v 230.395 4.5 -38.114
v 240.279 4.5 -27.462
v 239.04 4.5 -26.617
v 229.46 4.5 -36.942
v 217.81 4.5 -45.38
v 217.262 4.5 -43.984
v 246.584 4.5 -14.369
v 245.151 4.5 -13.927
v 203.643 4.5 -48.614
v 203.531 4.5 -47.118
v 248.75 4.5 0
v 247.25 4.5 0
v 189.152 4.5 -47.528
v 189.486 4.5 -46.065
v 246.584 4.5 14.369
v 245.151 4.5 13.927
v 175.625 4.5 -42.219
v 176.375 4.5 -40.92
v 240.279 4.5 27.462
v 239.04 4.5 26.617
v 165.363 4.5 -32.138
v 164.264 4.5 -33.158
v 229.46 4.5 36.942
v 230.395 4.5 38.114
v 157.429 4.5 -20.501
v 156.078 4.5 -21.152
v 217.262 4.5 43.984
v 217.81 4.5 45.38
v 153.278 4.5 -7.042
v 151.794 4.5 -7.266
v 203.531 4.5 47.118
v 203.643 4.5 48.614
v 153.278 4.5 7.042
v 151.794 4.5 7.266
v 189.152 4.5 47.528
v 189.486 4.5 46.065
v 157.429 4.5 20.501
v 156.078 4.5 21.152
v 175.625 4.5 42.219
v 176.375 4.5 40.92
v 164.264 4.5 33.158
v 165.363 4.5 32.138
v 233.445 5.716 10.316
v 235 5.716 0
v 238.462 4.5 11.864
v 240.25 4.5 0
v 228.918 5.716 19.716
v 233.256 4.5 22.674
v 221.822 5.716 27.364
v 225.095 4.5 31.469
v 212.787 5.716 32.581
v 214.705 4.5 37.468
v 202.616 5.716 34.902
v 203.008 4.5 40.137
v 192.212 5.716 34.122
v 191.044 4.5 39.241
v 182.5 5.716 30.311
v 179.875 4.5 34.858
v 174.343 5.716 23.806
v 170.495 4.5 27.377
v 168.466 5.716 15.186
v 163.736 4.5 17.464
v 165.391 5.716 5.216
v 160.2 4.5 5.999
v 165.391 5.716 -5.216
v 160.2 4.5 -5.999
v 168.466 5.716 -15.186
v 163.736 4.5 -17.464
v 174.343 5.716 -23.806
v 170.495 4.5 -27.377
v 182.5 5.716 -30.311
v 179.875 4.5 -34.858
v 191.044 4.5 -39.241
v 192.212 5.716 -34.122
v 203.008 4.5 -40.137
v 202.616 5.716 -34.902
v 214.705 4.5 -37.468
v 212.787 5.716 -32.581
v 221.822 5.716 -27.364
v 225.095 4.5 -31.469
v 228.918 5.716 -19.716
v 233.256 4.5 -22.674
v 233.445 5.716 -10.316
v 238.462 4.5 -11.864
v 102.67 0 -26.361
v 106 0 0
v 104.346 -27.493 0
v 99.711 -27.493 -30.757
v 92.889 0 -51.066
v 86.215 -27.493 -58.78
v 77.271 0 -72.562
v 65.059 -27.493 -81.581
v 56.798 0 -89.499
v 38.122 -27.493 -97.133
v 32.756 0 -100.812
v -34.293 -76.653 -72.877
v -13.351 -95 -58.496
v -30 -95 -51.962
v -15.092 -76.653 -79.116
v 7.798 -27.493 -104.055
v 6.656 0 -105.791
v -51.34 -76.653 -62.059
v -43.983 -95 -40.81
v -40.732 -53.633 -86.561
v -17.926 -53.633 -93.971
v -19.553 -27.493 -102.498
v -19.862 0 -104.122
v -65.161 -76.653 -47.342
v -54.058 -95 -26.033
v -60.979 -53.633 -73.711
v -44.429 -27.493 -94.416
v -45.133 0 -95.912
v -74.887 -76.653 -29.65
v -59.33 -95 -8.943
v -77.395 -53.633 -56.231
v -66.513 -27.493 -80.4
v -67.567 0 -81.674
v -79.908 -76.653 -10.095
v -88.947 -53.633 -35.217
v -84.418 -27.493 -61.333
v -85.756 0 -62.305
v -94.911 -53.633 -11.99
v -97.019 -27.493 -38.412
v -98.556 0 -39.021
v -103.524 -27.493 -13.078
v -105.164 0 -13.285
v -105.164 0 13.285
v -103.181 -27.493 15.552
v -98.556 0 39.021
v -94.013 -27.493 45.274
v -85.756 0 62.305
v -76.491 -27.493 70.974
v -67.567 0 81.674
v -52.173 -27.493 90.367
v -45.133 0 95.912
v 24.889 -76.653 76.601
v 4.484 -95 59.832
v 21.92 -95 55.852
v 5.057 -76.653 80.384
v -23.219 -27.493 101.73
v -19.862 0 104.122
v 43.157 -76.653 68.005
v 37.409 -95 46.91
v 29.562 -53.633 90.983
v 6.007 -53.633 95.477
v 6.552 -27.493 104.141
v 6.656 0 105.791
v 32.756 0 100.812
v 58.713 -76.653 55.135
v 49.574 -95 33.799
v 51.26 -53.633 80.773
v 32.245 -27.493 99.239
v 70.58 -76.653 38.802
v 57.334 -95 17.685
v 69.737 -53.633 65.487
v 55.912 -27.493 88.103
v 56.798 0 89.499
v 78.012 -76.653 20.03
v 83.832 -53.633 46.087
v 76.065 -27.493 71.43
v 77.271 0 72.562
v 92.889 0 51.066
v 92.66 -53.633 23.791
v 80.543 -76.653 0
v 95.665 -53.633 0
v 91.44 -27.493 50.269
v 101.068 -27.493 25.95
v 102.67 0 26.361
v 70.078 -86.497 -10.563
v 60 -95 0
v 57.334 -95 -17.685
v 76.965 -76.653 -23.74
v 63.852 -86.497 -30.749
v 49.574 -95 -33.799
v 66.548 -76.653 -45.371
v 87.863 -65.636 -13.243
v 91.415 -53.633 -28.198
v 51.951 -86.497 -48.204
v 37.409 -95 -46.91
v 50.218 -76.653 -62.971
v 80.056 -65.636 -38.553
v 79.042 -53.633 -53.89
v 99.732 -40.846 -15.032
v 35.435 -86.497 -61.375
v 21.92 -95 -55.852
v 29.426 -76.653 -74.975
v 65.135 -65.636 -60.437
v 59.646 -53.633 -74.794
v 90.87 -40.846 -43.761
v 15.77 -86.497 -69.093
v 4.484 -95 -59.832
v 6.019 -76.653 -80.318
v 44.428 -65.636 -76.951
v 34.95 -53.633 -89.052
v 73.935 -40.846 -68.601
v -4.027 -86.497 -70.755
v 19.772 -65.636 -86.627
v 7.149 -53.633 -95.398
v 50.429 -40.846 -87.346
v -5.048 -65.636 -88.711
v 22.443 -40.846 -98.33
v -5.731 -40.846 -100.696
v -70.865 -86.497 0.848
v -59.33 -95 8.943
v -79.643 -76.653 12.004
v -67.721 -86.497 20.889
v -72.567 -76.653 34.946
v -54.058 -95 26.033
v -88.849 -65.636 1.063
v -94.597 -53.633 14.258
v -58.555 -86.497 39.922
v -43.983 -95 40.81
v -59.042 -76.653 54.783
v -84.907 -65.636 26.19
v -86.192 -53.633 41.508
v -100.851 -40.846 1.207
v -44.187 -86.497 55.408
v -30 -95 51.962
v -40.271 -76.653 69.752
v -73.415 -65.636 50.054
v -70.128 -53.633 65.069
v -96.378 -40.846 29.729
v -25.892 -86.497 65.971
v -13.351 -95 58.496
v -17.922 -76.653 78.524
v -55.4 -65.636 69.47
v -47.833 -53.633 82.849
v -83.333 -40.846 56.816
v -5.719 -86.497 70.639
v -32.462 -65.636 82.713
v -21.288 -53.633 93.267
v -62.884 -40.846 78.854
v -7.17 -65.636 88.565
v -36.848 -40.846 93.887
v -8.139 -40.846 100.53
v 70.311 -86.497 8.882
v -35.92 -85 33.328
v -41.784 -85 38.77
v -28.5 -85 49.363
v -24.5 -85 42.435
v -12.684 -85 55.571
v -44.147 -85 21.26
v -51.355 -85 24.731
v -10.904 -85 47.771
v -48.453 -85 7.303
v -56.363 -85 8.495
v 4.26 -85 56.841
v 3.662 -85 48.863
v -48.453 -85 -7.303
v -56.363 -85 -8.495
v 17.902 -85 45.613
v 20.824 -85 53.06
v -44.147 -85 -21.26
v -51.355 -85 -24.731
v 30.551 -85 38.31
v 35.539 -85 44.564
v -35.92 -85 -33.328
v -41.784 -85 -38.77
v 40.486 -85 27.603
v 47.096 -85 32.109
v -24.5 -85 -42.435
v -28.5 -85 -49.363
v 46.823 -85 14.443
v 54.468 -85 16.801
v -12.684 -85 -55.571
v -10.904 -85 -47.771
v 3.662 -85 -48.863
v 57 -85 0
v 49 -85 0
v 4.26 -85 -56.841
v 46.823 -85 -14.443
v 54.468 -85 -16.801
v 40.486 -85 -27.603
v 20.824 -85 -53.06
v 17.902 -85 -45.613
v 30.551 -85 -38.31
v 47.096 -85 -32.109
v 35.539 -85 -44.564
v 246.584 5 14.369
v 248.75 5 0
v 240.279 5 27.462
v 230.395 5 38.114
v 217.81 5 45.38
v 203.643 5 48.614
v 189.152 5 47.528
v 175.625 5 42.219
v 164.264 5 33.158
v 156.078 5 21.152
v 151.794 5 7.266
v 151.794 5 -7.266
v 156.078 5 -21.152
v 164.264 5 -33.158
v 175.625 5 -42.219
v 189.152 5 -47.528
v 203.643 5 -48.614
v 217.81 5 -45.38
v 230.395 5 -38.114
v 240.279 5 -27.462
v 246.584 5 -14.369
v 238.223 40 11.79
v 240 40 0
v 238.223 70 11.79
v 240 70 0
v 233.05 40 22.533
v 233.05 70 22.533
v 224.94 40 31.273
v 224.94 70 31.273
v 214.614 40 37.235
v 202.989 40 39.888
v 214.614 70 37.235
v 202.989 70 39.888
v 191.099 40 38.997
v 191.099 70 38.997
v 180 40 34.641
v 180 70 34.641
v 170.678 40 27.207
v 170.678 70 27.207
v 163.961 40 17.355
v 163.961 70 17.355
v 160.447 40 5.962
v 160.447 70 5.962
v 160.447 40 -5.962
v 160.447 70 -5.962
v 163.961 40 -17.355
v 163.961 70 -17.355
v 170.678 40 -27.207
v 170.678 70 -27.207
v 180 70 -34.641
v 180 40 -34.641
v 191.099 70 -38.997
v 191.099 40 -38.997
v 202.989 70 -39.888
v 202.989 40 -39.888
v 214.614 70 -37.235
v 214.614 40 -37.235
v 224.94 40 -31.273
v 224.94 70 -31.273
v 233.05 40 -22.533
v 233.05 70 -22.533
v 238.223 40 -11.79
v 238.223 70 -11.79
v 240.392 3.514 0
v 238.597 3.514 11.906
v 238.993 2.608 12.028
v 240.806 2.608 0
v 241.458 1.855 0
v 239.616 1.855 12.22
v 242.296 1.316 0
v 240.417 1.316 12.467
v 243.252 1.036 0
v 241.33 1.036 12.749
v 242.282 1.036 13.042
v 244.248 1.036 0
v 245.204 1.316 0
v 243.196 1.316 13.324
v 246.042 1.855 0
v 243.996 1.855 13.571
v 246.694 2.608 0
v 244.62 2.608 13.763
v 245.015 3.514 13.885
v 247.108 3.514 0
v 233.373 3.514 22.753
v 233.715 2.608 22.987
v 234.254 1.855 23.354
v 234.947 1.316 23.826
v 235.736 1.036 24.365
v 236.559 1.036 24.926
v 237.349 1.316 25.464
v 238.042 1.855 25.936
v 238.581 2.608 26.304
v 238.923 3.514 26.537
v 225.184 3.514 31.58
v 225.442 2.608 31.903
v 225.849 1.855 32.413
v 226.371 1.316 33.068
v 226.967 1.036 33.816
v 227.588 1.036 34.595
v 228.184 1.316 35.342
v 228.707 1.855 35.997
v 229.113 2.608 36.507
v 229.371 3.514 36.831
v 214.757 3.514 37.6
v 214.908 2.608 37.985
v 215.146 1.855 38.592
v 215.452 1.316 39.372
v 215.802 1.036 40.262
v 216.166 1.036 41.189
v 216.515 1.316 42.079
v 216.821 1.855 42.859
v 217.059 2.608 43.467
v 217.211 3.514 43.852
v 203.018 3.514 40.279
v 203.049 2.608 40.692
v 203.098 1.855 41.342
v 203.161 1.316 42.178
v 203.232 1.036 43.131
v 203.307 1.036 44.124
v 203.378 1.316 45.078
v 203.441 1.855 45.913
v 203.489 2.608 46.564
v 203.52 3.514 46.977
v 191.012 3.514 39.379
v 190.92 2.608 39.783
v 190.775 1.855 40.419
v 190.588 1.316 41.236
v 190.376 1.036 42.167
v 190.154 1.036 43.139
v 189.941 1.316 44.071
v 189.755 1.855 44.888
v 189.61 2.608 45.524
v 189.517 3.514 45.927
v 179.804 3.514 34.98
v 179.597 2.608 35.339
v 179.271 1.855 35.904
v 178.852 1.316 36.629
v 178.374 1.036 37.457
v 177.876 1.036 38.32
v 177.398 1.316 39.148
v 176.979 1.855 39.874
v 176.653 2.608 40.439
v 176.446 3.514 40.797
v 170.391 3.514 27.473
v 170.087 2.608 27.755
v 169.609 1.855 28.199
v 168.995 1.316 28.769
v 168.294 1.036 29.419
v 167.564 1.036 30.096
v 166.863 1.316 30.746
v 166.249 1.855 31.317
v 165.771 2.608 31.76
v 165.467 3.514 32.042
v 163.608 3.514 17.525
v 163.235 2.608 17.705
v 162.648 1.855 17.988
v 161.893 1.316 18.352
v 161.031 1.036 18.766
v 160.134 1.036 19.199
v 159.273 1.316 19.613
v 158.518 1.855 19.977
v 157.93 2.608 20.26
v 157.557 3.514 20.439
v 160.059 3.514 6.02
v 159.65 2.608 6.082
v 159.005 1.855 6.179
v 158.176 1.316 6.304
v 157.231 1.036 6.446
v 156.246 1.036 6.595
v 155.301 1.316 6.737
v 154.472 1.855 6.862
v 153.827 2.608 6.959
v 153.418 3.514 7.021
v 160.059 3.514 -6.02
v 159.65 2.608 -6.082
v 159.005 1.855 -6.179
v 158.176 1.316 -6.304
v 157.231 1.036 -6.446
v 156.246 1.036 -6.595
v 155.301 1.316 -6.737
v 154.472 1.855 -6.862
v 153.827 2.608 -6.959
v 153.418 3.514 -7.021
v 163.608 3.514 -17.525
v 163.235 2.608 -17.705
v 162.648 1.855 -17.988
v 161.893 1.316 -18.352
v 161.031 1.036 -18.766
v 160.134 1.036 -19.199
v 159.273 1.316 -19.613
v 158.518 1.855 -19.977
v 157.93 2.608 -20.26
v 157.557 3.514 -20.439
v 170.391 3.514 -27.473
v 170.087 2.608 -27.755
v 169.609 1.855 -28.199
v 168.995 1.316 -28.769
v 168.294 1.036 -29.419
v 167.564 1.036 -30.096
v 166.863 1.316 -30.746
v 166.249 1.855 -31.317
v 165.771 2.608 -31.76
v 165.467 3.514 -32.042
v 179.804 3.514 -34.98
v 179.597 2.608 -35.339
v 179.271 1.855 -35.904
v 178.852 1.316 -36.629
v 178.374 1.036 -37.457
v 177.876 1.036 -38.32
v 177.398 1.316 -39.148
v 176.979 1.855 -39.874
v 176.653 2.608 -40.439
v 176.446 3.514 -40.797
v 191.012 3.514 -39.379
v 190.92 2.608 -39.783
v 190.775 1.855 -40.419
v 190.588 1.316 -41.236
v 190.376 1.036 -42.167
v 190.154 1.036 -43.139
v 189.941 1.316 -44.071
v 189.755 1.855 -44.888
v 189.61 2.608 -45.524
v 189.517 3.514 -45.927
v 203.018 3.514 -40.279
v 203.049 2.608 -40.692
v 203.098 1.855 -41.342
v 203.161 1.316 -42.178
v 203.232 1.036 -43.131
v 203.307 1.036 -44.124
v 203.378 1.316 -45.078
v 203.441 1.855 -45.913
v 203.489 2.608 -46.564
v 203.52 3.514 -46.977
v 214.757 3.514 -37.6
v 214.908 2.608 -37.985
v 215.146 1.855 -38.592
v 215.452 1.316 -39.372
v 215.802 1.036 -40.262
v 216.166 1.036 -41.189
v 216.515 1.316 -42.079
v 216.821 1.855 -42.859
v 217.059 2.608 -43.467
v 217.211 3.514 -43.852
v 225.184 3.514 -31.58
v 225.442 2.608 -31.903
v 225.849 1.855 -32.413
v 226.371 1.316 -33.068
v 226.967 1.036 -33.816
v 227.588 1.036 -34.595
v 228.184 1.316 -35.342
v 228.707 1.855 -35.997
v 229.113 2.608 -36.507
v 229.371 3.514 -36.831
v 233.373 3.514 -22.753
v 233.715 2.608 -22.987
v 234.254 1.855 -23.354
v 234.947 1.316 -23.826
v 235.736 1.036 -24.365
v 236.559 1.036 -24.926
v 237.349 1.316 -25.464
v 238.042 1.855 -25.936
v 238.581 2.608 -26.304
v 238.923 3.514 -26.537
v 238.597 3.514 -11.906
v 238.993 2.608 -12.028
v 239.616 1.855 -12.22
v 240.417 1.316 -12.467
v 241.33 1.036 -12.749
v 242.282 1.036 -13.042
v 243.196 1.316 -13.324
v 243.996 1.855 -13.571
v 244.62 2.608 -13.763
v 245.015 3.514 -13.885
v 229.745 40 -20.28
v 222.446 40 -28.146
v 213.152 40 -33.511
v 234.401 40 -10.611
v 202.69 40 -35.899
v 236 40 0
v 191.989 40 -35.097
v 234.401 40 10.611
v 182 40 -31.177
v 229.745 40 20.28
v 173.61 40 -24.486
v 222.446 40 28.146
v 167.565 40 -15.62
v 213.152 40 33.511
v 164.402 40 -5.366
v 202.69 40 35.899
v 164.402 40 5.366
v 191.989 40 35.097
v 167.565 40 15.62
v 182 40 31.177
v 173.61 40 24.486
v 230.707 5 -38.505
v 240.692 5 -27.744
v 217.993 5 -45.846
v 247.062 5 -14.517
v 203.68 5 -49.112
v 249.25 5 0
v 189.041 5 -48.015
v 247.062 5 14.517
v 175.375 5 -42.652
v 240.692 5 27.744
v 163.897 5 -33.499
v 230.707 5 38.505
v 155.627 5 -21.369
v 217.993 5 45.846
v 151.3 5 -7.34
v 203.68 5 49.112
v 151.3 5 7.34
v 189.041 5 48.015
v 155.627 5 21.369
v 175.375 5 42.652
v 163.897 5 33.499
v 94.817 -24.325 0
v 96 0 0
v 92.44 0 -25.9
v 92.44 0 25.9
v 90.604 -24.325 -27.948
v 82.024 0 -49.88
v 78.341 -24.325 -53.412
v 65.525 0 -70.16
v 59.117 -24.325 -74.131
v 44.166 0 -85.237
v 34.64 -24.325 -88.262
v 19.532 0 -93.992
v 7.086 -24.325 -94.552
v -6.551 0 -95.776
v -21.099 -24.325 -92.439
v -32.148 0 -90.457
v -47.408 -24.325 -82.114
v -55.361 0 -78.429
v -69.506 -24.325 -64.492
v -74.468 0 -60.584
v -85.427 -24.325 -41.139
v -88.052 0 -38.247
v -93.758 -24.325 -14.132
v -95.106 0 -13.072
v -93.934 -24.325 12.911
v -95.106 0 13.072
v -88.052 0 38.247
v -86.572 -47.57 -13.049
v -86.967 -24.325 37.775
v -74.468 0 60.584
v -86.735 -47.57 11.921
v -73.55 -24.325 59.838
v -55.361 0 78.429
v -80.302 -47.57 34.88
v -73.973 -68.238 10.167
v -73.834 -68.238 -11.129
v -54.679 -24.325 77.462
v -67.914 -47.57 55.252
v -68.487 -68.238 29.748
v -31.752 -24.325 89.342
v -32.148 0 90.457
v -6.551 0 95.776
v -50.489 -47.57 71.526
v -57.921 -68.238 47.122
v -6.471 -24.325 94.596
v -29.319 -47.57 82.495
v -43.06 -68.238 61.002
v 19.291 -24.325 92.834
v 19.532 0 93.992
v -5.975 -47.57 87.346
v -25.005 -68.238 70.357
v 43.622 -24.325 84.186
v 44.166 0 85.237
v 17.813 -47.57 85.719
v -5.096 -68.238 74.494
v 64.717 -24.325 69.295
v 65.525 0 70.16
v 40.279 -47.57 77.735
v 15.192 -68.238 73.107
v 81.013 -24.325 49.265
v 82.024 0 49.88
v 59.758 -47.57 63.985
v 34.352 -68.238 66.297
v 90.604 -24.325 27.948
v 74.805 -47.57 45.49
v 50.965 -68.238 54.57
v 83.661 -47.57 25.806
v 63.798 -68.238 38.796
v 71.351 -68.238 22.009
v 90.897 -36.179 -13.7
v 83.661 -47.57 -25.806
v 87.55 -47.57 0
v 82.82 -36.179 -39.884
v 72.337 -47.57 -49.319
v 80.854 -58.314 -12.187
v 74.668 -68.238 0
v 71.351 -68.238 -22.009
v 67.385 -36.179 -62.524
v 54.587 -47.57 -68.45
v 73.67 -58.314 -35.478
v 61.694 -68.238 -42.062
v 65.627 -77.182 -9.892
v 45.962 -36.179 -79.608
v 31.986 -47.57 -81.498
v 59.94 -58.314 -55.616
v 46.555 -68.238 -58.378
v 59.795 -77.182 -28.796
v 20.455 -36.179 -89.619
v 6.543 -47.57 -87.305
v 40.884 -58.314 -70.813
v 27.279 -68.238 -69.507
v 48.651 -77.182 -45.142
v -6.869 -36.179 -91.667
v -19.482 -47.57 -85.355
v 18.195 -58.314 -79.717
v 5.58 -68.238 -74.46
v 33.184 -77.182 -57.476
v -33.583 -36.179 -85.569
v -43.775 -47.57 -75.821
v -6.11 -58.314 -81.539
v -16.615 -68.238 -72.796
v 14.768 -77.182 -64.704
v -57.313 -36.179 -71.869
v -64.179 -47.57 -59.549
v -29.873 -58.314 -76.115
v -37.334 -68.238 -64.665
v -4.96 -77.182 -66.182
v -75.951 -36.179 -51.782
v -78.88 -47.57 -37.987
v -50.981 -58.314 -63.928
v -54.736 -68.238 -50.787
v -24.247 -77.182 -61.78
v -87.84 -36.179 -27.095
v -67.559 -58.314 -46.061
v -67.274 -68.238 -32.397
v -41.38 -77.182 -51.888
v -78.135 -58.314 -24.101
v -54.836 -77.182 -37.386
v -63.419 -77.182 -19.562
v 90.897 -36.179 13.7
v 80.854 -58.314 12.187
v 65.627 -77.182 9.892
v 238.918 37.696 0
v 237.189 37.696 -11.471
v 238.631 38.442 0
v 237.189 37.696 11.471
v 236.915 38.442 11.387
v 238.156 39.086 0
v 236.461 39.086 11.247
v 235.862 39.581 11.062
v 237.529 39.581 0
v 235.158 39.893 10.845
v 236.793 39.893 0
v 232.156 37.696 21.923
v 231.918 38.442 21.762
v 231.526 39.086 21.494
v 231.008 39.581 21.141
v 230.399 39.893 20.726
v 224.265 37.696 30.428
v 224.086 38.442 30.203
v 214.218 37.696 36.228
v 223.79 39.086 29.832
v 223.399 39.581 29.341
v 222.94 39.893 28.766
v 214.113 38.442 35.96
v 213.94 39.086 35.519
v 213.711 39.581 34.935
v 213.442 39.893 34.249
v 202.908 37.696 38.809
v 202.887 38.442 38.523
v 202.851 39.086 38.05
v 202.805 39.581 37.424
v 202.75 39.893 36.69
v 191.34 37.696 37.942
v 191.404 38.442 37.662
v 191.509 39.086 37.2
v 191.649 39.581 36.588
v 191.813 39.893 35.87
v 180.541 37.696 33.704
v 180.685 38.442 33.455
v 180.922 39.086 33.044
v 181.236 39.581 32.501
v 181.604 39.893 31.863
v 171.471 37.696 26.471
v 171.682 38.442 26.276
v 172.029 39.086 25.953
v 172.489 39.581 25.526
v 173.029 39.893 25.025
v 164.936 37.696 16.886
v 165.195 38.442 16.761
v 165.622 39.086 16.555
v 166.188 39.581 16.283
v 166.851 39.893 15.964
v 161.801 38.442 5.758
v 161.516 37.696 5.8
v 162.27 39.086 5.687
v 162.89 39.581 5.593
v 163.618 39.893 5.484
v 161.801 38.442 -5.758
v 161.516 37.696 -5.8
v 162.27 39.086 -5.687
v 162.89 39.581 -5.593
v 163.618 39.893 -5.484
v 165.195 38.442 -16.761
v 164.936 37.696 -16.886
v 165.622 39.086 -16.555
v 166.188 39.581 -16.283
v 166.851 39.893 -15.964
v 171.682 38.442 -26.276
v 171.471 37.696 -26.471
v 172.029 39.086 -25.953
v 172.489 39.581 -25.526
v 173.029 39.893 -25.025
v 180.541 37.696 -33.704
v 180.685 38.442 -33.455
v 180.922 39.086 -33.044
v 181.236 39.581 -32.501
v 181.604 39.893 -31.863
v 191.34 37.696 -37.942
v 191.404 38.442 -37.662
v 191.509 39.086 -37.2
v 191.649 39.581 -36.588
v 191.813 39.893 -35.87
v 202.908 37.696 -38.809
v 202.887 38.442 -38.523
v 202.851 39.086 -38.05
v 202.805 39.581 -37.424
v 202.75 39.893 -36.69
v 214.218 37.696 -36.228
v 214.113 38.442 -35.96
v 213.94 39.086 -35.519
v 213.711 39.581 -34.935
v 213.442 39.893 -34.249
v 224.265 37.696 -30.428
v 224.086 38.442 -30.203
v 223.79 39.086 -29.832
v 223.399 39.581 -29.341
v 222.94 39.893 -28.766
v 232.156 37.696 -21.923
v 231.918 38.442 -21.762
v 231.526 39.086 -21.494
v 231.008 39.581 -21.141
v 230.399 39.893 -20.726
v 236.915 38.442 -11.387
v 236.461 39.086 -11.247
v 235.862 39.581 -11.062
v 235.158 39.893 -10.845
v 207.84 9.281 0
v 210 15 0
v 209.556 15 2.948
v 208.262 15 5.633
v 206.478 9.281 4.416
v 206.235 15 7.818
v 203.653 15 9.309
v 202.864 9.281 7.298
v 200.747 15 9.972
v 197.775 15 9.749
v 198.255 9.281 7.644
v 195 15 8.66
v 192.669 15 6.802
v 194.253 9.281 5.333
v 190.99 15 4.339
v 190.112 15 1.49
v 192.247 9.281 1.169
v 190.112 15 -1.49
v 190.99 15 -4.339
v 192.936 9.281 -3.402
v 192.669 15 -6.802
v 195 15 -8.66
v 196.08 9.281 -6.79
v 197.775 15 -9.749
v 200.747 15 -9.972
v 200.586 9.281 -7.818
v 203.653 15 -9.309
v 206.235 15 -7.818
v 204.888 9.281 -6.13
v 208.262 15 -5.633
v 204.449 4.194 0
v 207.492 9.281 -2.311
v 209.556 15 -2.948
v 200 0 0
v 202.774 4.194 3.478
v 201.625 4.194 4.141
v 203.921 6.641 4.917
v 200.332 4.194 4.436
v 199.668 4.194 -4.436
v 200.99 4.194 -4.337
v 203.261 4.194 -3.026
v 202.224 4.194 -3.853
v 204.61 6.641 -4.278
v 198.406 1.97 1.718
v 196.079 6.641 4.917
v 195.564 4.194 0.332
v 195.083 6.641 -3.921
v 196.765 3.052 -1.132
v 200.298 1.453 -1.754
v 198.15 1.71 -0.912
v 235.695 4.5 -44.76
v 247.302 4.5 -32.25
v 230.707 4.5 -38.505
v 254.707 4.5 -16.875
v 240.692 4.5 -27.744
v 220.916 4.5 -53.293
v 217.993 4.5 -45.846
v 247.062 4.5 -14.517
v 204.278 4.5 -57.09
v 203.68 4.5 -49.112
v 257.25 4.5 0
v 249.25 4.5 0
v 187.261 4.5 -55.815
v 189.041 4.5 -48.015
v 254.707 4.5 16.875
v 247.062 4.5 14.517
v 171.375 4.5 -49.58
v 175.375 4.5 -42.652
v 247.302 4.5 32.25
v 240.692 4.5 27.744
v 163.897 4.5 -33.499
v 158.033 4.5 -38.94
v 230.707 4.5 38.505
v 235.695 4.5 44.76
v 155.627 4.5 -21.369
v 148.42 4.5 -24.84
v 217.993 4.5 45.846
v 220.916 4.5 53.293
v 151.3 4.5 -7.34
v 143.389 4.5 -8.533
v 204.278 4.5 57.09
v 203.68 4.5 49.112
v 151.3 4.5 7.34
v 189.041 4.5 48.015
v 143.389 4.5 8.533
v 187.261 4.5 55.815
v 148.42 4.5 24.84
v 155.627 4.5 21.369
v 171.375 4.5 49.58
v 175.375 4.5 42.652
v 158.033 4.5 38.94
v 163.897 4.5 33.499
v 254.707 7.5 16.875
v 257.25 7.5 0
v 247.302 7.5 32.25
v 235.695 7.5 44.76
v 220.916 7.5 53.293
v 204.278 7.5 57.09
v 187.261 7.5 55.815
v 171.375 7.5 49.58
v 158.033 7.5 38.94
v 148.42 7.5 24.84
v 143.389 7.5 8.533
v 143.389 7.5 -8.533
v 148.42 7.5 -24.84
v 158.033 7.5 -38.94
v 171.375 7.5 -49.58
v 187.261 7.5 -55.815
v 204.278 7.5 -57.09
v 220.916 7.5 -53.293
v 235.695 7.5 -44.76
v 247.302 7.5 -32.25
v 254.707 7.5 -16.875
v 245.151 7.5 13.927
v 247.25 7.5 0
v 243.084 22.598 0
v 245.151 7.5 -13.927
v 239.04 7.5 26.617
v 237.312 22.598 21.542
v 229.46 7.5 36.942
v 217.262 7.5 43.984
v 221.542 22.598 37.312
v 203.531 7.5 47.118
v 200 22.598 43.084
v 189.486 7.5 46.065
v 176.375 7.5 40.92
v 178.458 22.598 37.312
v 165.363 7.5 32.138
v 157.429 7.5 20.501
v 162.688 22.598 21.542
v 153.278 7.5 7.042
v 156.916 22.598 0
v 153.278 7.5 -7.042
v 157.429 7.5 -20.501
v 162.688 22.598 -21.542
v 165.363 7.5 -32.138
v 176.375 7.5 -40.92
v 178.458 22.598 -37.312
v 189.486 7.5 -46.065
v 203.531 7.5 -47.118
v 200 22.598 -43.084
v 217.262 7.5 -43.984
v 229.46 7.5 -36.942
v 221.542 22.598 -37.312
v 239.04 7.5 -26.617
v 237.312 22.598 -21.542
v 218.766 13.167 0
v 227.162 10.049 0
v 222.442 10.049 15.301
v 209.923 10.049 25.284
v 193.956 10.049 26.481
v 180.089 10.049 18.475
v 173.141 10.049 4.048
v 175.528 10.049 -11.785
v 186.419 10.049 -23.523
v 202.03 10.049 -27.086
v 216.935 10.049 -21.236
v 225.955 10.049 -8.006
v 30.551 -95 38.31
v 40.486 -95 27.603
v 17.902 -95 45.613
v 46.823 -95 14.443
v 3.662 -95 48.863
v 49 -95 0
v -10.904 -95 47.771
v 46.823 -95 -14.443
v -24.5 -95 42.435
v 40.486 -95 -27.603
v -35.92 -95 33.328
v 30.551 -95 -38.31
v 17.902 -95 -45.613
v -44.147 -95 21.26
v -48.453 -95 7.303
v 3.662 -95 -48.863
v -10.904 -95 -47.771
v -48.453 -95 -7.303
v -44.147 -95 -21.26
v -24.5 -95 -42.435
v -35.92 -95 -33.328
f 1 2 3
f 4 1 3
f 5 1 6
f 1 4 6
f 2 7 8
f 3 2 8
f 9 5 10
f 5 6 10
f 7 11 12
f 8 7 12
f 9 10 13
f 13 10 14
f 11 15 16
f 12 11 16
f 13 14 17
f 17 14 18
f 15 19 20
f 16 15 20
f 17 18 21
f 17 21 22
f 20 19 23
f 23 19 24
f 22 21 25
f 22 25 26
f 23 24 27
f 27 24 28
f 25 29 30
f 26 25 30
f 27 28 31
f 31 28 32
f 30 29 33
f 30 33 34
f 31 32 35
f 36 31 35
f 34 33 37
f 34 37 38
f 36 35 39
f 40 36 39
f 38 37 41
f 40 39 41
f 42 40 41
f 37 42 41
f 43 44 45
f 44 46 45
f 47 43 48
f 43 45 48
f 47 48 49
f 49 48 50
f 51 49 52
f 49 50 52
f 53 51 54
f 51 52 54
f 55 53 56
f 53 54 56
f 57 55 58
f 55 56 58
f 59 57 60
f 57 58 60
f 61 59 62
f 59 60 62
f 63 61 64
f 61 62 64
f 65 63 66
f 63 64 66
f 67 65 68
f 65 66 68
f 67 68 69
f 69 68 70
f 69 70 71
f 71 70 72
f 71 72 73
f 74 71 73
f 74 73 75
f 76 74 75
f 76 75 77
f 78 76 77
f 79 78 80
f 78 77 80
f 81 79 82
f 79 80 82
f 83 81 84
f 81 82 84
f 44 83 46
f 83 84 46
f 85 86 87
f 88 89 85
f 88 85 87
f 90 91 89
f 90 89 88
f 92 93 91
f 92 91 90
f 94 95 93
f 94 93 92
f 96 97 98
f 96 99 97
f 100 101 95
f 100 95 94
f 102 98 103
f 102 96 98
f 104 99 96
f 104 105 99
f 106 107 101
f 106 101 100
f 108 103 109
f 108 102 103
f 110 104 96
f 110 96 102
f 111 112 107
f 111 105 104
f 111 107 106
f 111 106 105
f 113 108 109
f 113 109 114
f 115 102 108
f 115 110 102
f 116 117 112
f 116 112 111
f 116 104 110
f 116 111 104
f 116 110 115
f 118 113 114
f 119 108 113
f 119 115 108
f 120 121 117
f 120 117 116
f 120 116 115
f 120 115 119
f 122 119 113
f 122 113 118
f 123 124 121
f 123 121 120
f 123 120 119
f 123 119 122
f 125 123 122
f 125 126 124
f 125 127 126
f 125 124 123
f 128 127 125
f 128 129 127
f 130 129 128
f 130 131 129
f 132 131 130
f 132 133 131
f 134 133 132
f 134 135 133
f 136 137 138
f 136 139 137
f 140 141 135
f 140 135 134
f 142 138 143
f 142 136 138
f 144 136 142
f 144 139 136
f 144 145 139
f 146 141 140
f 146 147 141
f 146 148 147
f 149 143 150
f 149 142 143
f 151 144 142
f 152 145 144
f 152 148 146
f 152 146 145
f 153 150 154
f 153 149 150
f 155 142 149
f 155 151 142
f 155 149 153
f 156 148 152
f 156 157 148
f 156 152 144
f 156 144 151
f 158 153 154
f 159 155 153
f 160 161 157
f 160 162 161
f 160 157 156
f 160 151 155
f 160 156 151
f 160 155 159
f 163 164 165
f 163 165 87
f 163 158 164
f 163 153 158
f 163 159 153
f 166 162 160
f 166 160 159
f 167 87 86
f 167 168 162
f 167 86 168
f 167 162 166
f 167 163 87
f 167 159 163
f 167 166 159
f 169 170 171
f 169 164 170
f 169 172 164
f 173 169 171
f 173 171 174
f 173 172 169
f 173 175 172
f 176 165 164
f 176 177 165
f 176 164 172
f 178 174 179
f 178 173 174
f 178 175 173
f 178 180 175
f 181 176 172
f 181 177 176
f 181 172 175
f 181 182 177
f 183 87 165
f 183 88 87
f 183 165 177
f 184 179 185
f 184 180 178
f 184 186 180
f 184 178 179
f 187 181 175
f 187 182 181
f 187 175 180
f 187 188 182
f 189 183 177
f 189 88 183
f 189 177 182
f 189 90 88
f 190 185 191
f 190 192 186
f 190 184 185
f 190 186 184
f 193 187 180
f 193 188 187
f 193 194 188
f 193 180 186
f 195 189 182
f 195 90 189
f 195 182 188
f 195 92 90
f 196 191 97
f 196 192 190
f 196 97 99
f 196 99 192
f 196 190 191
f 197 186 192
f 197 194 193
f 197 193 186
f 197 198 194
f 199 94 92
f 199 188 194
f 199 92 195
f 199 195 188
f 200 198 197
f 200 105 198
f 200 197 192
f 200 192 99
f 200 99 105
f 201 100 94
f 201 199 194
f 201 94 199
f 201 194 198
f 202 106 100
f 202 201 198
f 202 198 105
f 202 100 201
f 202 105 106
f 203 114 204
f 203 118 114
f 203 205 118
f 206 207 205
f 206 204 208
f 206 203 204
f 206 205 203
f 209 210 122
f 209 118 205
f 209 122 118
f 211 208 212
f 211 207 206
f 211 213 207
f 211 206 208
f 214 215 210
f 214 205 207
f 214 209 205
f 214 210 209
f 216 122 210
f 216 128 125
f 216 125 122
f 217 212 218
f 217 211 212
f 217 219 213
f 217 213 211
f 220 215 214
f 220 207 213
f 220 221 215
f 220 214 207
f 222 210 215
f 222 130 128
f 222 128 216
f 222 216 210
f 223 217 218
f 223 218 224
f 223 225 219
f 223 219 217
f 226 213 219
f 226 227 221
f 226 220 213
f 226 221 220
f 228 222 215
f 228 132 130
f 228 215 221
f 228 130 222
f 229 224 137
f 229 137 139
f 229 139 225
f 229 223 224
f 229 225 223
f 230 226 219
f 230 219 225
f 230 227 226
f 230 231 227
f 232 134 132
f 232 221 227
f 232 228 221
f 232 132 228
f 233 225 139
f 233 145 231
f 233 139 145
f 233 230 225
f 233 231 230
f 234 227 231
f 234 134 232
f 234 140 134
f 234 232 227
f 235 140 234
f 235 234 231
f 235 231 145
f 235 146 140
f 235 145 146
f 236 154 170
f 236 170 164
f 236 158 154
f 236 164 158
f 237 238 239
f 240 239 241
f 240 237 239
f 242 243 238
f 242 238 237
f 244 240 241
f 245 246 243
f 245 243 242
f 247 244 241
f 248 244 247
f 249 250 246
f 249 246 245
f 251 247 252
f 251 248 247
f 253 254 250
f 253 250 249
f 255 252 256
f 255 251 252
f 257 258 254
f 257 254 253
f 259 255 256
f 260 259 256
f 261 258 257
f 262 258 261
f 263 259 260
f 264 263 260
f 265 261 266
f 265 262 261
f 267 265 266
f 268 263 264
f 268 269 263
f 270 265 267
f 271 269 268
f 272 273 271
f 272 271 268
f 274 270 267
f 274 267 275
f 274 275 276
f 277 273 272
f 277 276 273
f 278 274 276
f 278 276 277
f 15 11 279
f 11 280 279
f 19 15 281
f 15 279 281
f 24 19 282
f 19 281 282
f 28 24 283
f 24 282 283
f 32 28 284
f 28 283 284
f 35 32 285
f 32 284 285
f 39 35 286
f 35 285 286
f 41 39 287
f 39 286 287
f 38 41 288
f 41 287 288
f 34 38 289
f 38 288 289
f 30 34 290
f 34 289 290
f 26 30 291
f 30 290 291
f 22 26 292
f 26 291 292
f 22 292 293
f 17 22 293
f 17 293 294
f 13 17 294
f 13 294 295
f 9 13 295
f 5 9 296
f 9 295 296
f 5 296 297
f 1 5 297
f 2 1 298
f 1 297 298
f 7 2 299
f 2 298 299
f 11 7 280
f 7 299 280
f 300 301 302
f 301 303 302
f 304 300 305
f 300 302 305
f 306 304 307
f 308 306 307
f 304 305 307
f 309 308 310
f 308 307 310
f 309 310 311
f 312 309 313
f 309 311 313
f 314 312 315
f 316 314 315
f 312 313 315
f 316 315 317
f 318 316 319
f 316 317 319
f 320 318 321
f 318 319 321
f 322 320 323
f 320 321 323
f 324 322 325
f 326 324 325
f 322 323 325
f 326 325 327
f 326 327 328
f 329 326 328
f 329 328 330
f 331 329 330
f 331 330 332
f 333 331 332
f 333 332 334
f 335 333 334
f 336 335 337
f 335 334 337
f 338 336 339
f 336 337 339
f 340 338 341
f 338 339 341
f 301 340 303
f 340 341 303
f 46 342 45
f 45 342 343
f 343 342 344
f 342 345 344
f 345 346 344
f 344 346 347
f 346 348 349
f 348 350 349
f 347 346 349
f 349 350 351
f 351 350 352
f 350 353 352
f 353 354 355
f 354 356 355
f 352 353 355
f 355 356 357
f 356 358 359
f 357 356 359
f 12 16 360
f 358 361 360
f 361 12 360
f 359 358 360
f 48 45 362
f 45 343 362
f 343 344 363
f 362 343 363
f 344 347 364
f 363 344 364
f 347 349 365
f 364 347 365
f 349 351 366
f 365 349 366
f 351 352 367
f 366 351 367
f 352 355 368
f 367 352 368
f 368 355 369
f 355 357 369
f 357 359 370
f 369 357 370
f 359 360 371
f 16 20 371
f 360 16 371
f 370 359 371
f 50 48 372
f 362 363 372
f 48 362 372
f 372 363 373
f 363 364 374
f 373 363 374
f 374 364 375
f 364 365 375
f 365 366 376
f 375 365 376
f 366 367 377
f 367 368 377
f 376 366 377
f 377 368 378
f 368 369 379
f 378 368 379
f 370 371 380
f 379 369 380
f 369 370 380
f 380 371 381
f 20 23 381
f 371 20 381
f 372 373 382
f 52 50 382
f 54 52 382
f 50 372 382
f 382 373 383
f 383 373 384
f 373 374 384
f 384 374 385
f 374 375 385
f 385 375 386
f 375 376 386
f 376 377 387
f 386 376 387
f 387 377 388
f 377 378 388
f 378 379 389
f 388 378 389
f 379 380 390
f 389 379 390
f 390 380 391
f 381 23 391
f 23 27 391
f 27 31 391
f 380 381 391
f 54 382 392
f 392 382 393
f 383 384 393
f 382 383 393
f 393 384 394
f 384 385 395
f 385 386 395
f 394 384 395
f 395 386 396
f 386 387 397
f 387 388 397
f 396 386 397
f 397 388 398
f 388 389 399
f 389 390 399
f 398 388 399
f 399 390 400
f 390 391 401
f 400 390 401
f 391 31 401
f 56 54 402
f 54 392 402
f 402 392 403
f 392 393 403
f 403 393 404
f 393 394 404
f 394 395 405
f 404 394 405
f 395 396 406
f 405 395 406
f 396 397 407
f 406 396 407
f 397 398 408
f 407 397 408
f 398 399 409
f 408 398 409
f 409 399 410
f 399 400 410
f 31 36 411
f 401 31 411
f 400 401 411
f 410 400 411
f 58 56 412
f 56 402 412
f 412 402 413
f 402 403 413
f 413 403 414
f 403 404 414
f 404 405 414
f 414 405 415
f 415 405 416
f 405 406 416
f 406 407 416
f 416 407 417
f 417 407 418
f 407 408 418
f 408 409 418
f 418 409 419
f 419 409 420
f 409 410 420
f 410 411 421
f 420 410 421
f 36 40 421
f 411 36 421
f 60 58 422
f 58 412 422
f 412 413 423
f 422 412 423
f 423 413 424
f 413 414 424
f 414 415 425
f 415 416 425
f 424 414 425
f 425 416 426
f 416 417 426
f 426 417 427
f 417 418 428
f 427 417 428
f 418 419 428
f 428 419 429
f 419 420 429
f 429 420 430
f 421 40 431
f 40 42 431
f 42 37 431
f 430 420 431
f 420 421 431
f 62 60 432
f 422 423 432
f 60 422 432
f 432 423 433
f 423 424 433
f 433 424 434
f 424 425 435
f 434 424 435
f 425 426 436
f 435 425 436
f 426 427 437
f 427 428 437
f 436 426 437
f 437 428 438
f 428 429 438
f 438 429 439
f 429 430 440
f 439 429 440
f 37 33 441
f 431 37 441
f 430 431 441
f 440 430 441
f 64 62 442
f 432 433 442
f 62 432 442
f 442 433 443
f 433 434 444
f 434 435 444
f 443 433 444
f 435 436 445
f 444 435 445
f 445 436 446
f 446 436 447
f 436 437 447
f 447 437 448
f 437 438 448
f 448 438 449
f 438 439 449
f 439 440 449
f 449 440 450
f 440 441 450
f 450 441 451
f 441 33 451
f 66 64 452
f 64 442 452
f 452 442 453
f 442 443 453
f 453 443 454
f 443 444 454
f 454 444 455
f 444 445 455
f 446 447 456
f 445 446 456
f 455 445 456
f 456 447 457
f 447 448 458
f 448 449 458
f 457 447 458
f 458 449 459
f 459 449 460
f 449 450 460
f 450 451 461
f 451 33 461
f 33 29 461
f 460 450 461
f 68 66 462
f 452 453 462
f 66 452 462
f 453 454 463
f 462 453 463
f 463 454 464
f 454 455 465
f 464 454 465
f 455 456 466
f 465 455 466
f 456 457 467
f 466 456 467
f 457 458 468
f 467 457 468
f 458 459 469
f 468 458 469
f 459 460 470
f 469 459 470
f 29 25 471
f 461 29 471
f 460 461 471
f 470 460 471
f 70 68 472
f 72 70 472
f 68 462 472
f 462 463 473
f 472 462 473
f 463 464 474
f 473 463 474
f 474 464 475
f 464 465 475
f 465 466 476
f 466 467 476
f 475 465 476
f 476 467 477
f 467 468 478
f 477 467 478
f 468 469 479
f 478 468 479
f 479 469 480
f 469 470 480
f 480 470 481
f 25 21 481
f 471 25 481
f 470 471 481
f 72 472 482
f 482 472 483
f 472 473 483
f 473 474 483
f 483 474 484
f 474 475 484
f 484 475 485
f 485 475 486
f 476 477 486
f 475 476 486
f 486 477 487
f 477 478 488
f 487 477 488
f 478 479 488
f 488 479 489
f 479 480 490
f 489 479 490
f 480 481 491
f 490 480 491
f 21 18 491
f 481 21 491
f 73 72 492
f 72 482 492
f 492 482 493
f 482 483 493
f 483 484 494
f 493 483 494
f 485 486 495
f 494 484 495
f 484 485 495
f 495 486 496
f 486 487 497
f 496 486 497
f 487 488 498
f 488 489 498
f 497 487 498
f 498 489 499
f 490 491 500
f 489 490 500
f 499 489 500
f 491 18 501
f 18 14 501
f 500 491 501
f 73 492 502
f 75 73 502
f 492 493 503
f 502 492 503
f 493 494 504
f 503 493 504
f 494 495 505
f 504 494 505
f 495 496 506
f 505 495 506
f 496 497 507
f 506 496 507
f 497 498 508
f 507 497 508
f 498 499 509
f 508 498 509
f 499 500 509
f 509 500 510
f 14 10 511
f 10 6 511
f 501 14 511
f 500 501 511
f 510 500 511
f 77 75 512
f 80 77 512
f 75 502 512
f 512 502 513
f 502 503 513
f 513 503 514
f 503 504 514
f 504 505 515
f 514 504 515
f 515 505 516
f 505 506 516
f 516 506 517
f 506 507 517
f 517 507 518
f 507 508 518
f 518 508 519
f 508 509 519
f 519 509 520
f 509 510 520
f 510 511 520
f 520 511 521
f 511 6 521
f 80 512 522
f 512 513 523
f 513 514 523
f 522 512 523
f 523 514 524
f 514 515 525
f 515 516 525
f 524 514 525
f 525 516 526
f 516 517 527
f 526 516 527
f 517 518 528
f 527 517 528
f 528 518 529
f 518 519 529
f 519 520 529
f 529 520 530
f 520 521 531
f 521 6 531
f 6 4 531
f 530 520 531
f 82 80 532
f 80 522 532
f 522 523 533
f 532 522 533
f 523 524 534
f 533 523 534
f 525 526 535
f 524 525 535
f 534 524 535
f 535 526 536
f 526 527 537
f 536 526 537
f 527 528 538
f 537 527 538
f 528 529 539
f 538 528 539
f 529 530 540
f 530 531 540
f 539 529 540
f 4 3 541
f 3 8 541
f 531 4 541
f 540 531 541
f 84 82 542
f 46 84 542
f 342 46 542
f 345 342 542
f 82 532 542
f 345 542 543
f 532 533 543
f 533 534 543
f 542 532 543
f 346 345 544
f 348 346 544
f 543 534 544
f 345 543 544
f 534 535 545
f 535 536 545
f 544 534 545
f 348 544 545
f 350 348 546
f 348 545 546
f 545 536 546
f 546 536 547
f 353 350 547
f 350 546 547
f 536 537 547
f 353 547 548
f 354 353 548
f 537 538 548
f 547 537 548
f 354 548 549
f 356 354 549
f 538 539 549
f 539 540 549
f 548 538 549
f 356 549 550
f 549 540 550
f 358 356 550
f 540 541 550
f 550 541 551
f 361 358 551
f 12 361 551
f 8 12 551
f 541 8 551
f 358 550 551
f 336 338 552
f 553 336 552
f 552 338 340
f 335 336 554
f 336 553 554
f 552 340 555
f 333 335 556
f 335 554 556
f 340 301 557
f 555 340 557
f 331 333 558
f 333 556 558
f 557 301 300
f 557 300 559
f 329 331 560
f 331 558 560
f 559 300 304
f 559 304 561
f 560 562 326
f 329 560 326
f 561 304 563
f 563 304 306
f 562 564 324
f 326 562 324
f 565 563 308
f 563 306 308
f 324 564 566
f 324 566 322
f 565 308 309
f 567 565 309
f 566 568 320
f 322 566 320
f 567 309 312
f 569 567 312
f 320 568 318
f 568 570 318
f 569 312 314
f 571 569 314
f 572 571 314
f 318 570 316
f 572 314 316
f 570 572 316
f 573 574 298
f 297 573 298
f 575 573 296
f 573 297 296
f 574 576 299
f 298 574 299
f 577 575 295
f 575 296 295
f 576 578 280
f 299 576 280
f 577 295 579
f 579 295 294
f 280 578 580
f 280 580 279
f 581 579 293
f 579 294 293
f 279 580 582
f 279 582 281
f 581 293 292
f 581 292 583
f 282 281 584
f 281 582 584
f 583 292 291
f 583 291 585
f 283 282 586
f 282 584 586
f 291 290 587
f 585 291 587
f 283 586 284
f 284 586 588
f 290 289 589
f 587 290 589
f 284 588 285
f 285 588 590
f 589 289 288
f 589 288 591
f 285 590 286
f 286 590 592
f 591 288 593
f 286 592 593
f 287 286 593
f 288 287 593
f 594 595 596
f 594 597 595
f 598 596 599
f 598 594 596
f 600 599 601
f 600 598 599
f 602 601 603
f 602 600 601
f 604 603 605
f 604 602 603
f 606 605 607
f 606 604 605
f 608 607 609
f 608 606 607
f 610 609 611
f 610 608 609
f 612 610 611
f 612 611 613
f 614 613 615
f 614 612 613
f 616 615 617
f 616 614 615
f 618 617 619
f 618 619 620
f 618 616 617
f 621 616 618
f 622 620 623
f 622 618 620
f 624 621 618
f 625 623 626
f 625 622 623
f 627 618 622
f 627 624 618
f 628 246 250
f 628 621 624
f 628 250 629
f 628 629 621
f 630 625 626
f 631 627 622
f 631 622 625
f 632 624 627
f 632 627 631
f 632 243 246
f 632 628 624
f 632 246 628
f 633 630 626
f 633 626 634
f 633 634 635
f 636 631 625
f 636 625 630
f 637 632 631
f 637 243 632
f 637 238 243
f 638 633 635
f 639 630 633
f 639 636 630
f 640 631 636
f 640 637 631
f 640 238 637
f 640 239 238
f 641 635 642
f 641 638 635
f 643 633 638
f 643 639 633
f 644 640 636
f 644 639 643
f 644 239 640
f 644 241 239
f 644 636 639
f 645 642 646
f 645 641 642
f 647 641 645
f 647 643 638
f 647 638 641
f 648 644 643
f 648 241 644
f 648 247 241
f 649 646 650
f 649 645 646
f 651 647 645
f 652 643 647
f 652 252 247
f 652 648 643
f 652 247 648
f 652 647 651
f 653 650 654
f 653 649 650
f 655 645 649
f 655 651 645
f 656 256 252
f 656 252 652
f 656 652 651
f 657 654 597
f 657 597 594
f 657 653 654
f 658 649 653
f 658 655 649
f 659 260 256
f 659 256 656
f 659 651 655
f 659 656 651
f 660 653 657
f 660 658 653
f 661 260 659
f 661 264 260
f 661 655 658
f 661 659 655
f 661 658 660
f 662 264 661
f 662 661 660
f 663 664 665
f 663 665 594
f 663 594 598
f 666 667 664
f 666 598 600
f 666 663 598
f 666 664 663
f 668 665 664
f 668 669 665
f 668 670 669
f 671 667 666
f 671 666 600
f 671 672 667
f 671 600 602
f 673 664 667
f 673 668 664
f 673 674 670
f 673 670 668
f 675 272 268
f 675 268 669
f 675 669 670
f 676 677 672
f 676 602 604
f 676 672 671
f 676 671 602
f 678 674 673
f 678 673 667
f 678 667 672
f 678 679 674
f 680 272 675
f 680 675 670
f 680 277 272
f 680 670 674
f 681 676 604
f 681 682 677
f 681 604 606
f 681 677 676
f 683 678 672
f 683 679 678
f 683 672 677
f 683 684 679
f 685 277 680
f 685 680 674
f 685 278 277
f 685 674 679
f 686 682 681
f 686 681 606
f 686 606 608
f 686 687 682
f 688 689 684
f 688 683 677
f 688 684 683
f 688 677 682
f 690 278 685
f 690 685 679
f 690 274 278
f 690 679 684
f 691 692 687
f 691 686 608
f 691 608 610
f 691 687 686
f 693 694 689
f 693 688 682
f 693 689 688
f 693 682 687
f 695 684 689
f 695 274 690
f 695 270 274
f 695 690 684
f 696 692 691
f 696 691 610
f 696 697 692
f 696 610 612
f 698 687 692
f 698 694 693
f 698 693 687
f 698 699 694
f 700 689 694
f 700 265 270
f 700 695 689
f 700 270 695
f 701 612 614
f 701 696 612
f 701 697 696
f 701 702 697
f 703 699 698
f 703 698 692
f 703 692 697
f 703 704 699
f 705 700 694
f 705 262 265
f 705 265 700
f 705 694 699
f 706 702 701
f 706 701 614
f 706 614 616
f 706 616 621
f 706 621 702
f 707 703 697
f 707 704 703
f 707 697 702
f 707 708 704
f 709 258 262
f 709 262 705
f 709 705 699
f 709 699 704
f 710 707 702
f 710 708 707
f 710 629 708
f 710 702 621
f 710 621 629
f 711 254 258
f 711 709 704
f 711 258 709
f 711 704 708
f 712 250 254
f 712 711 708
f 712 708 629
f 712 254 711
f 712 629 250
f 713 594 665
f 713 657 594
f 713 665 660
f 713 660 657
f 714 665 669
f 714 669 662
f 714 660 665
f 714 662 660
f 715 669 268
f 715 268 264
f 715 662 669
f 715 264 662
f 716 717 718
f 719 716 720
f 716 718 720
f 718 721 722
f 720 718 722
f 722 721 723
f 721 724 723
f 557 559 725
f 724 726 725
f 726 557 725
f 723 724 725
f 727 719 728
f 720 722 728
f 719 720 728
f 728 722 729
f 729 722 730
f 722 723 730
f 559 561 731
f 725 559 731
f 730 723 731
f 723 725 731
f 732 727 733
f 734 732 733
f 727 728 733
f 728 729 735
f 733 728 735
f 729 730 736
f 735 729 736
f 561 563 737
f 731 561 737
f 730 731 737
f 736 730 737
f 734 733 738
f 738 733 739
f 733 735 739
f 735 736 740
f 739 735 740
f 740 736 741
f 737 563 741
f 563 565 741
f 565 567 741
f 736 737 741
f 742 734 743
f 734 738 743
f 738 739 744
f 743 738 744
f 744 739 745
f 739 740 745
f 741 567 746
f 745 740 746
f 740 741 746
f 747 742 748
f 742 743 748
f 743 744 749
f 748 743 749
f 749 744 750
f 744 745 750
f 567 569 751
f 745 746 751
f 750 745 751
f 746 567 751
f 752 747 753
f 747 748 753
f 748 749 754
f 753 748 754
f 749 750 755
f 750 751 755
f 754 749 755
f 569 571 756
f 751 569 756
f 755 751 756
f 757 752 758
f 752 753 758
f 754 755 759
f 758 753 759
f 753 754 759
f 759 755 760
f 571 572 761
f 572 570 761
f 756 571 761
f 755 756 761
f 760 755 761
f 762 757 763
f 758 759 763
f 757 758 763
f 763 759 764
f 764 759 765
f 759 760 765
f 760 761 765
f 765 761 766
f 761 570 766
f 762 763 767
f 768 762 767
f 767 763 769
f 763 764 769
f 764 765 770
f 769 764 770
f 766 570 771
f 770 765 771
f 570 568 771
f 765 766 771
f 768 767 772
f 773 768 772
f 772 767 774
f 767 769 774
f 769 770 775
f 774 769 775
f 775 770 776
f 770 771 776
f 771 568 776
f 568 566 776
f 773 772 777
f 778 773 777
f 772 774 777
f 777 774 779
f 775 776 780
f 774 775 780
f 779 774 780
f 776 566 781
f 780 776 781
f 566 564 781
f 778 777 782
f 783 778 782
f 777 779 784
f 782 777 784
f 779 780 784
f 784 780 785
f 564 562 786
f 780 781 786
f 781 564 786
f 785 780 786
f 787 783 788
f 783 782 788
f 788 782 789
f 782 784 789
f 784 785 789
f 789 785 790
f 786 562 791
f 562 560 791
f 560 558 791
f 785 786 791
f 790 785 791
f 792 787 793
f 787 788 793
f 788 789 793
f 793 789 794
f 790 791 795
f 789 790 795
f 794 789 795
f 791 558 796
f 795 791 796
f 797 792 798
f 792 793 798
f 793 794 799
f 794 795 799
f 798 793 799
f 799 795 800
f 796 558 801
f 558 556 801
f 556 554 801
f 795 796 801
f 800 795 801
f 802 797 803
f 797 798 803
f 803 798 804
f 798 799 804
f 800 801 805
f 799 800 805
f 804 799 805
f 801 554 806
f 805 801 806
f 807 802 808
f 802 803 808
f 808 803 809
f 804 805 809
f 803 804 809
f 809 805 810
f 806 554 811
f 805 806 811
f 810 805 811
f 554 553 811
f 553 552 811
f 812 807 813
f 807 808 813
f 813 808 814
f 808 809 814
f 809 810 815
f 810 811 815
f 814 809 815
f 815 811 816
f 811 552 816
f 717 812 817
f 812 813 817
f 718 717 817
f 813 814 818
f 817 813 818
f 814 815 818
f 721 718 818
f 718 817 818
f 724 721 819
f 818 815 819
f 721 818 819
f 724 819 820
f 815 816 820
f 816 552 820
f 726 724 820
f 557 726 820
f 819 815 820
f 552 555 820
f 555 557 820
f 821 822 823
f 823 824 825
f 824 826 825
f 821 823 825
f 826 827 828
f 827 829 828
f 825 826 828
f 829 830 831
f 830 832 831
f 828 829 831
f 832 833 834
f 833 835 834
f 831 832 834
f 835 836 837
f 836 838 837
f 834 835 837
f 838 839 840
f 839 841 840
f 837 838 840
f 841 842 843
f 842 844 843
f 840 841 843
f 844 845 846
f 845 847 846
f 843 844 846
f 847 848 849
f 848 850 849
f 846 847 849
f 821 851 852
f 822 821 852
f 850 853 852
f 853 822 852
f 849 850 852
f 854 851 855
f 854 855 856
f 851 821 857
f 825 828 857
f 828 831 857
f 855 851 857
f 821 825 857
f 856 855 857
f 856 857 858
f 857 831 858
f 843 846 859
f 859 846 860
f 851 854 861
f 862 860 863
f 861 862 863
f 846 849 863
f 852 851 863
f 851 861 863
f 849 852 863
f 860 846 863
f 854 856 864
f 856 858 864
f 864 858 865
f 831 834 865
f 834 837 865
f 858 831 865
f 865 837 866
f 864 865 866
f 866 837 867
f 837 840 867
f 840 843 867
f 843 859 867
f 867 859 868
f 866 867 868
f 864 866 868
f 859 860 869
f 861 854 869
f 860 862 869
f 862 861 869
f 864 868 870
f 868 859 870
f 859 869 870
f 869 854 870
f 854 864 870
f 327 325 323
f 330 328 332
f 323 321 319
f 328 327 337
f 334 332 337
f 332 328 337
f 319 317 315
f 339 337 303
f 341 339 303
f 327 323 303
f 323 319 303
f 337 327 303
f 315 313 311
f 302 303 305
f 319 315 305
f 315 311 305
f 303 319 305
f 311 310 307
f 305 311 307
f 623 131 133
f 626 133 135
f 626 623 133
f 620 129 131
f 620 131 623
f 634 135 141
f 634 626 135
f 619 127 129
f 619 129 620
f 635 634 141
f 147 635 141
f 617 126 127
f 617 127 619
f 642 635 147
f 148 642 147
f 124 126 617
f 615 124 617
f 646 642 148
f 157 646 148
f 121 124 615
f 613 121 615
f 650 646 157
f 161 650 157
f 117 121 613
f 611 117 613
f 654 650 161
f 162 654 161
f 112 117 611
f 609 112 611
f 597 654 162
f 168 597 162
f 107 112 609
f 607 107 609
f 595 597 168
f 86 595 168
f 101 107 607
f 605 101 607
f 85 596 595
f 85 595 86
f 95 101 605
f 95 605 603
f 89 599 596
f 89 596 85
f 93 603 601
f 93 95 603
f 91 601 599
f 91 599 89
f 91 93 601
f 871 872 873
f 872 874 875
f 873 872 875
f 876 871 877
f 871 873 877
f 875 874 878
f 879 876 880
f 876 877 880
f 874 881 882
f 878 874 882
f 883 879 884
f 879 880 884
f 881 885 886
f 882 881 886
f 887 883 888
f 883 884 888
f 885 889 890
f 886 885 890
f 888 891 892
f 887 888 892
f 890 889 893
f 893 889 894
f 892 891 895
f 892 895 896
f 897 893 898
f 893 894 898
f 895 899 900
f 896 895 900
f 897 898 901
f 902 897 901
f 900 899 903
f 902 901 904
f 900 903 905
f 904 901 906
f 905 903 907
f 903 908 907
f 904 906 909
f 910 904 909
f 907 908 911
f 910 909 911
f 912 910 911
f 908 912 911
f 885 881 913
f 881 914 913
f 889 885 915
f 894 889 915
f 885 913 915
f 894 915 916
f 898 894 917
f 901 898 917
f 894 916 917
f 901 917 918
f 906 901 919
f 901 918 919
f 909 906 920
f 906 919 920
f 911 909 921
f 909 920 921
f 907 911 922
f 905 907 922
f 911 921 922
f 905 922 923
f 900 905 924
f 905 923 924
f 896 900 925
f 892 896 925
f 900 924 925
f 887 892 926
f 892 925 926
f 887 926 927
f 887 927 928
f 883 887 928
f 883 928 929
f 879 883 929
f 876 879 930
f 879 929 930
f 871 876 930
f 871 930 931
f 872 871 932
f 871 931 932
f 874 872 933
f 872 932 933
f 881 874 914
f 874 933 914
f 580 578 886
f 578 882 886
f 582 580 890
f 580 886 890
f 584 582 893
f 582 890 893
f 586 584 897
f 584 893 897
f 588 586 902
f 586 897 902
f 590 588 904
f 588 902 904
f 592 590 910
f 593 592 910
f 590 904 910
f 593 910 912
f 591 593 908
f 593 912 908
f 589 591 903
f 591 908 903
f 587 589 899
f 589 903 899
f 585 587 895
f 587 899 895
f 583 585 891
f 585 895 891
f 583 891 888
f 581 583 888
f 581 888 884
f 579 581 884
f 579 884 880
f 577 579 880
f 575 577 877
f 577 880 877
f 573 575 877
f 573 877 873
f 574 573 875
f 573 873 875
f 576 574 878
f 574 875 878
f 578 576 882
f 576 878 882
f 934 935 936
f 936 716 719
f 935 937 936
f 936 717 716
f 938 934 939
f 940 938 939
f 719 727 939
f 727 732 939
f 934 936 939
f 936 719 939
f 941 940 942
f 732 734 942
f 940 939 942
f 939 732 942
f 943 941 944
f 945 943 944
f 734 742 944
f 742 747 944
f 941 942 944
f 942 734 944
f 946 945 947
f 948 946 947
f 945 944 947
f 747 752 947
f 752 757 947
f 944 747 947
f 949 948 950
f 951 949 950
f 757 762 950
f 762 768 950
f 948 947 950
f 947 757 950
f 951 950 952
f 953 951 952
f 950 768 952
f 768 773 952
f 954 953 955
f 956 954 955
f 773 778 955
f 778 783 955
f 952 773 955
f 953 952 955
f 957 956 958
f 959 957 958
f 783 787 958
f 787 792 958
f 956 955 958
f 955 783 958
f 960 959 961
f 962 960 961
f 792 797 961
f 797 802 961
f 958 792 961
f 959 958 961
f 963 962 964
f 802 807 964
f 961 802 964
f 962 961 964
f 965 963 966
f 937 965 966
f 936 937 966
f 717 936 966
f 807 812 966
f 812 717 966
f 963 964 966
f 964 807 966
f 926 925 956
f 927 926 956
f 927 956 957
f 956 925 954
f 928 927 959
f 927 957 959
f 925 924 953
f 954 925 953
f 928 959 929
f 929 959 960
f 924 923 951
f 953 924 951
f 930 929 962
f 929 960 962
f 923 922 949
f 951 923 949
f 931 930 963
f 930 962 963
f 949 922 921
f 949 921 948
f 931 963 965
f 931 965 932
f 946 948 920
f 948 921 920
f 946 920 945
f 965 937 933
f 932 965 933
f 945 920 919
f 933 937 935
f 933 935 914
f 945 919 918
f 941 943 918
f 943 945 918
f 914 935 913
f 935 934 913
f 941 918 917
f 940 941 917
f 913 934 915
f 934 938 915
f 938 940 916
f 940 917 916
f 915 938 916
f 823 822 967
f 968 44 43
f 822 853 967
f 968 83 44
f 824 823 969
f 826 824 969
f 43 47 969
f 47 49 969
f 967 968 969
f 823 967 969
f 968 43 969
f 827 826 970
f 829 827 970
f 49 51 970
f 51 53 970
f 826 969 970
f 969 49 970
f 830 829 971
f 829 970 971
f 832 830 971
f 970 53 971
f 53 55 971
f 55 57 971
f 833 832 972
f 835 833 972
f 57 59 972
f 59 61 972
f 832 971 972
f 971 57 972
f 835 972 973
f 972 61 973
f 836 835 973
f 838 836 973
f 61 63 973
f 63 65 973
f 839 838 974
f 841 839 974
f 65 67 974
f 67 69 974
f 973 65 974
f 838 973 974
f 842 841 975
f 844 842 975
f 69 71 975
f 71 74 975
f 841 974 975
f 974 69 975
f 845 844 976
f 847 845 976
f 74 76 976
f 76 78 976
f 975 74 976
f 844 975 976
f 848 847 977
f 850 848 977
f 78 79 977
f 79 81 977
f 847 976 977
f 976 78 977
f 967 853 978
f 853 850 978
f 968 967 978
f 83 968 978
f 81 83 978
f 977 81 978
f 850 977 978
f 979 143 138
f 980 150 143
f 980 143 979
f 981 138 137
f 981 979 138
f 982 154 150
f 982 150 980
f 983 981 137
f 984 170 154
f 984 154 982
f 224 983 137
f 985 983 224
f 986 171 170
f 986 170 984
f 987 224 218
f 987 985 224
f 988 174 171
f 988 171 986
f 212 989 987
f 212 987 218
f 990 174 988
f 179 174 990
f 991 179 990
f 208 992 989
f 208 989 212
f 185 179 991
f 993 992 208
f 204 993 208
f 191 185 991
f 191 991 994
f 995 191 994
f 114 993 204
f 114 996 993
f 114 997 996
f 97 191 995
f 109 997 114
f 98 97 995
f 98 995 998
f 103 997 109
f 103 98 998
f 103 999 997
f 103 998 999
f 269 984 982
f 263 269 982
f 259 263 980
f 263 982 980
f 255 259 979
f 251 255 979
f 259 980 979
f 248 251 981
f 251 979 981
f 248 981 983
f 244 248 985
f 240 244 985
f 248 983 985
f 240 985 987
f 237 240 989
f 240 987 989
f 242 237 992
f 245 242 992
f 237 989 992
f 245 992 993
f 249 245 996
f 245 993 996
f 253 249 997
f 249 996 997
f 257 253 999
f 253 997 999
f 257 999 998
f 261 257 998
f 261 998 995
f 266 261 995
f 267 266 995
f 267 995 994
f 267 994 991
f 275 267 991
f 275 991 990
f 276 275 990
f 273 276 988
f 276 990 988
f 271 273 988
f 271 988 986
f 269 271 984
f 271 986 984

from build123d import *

# Parameters (mm, degrees)
F6_R     = 49
F7_DEPTH = 10


with BuildPart() as f2:
    # F0 (on Top) → F2 (revolve)
    with BuildSketch(Plane.XY):
        with BuildLine():
            Line((0, -85), (0, -95))
            Line((0, -95), (60, -95))
            ThreePointArc((60, -95), (95.66539, -53.632715), (106, 0))
            Line((106, 0), (96, 0))
            ThreePointArc((96, 0), (87.550254, -47.570117), (57, -85))
            Line((57, -85), (0, -85))
        make_face()
    revolve(axis=Axis((0, 46.997083, 0), (0, 1, 0)))

    # F6 (on face) → F7 (cut)
    with BuildSketch(Plane.XZ.offset(95)):
        Circle(F6_R)
    extrude(amount=-F7_DEPTH, mode=Mode.SUBTRACT)


with BuildPart() as f5:
    # F3 (on Top) → F5 (revolve)
    with BuildSketch(Plane.XY):
        with BuildLine():
            Line((240, 70), (200, 70))
            Line((200, 70), (200, 0))
            ThreePointArc((200, 0), (206.288901, 6.640732), (210, 15))
            ThreePointArc((210, 15), (223.022351, 11.764457), (235, 5.715796))
            Line((235, 5.715796), (240.25, 4.5))
            ThreePointArc((240.25, 4.5), (243.75, 1), (247.25, 4.5))
            Line((247.25, 4.5), (248.75, 4.5))
            Line((248.75, 4.5), (248.75, 5))
            Line((248.75, 5), (249.25, 5))
            Line((249.25, 5), (249.25, 4.5))
            Line((249.25, 4.5), (257.25, 4.5))
            Line((257.25, 4.5), (257.25, 7.5))
            Line((257.25, 7.5), (247.25, 7.5))
            Line((247.25, 7.5), (238.918243, 37.6956))
            ThreePointArc((238.918243, 37.6956), (237.859193, 39.354443), (236, 40))
            Line((236, 40), (240, 40))
            Line((240, 40), (240, 70))
        make_face()
    revolve(axis=Axis((200, 32.166739, 0), (0, -1, 0)))


solid = Compound([f2.part, f5.part])
